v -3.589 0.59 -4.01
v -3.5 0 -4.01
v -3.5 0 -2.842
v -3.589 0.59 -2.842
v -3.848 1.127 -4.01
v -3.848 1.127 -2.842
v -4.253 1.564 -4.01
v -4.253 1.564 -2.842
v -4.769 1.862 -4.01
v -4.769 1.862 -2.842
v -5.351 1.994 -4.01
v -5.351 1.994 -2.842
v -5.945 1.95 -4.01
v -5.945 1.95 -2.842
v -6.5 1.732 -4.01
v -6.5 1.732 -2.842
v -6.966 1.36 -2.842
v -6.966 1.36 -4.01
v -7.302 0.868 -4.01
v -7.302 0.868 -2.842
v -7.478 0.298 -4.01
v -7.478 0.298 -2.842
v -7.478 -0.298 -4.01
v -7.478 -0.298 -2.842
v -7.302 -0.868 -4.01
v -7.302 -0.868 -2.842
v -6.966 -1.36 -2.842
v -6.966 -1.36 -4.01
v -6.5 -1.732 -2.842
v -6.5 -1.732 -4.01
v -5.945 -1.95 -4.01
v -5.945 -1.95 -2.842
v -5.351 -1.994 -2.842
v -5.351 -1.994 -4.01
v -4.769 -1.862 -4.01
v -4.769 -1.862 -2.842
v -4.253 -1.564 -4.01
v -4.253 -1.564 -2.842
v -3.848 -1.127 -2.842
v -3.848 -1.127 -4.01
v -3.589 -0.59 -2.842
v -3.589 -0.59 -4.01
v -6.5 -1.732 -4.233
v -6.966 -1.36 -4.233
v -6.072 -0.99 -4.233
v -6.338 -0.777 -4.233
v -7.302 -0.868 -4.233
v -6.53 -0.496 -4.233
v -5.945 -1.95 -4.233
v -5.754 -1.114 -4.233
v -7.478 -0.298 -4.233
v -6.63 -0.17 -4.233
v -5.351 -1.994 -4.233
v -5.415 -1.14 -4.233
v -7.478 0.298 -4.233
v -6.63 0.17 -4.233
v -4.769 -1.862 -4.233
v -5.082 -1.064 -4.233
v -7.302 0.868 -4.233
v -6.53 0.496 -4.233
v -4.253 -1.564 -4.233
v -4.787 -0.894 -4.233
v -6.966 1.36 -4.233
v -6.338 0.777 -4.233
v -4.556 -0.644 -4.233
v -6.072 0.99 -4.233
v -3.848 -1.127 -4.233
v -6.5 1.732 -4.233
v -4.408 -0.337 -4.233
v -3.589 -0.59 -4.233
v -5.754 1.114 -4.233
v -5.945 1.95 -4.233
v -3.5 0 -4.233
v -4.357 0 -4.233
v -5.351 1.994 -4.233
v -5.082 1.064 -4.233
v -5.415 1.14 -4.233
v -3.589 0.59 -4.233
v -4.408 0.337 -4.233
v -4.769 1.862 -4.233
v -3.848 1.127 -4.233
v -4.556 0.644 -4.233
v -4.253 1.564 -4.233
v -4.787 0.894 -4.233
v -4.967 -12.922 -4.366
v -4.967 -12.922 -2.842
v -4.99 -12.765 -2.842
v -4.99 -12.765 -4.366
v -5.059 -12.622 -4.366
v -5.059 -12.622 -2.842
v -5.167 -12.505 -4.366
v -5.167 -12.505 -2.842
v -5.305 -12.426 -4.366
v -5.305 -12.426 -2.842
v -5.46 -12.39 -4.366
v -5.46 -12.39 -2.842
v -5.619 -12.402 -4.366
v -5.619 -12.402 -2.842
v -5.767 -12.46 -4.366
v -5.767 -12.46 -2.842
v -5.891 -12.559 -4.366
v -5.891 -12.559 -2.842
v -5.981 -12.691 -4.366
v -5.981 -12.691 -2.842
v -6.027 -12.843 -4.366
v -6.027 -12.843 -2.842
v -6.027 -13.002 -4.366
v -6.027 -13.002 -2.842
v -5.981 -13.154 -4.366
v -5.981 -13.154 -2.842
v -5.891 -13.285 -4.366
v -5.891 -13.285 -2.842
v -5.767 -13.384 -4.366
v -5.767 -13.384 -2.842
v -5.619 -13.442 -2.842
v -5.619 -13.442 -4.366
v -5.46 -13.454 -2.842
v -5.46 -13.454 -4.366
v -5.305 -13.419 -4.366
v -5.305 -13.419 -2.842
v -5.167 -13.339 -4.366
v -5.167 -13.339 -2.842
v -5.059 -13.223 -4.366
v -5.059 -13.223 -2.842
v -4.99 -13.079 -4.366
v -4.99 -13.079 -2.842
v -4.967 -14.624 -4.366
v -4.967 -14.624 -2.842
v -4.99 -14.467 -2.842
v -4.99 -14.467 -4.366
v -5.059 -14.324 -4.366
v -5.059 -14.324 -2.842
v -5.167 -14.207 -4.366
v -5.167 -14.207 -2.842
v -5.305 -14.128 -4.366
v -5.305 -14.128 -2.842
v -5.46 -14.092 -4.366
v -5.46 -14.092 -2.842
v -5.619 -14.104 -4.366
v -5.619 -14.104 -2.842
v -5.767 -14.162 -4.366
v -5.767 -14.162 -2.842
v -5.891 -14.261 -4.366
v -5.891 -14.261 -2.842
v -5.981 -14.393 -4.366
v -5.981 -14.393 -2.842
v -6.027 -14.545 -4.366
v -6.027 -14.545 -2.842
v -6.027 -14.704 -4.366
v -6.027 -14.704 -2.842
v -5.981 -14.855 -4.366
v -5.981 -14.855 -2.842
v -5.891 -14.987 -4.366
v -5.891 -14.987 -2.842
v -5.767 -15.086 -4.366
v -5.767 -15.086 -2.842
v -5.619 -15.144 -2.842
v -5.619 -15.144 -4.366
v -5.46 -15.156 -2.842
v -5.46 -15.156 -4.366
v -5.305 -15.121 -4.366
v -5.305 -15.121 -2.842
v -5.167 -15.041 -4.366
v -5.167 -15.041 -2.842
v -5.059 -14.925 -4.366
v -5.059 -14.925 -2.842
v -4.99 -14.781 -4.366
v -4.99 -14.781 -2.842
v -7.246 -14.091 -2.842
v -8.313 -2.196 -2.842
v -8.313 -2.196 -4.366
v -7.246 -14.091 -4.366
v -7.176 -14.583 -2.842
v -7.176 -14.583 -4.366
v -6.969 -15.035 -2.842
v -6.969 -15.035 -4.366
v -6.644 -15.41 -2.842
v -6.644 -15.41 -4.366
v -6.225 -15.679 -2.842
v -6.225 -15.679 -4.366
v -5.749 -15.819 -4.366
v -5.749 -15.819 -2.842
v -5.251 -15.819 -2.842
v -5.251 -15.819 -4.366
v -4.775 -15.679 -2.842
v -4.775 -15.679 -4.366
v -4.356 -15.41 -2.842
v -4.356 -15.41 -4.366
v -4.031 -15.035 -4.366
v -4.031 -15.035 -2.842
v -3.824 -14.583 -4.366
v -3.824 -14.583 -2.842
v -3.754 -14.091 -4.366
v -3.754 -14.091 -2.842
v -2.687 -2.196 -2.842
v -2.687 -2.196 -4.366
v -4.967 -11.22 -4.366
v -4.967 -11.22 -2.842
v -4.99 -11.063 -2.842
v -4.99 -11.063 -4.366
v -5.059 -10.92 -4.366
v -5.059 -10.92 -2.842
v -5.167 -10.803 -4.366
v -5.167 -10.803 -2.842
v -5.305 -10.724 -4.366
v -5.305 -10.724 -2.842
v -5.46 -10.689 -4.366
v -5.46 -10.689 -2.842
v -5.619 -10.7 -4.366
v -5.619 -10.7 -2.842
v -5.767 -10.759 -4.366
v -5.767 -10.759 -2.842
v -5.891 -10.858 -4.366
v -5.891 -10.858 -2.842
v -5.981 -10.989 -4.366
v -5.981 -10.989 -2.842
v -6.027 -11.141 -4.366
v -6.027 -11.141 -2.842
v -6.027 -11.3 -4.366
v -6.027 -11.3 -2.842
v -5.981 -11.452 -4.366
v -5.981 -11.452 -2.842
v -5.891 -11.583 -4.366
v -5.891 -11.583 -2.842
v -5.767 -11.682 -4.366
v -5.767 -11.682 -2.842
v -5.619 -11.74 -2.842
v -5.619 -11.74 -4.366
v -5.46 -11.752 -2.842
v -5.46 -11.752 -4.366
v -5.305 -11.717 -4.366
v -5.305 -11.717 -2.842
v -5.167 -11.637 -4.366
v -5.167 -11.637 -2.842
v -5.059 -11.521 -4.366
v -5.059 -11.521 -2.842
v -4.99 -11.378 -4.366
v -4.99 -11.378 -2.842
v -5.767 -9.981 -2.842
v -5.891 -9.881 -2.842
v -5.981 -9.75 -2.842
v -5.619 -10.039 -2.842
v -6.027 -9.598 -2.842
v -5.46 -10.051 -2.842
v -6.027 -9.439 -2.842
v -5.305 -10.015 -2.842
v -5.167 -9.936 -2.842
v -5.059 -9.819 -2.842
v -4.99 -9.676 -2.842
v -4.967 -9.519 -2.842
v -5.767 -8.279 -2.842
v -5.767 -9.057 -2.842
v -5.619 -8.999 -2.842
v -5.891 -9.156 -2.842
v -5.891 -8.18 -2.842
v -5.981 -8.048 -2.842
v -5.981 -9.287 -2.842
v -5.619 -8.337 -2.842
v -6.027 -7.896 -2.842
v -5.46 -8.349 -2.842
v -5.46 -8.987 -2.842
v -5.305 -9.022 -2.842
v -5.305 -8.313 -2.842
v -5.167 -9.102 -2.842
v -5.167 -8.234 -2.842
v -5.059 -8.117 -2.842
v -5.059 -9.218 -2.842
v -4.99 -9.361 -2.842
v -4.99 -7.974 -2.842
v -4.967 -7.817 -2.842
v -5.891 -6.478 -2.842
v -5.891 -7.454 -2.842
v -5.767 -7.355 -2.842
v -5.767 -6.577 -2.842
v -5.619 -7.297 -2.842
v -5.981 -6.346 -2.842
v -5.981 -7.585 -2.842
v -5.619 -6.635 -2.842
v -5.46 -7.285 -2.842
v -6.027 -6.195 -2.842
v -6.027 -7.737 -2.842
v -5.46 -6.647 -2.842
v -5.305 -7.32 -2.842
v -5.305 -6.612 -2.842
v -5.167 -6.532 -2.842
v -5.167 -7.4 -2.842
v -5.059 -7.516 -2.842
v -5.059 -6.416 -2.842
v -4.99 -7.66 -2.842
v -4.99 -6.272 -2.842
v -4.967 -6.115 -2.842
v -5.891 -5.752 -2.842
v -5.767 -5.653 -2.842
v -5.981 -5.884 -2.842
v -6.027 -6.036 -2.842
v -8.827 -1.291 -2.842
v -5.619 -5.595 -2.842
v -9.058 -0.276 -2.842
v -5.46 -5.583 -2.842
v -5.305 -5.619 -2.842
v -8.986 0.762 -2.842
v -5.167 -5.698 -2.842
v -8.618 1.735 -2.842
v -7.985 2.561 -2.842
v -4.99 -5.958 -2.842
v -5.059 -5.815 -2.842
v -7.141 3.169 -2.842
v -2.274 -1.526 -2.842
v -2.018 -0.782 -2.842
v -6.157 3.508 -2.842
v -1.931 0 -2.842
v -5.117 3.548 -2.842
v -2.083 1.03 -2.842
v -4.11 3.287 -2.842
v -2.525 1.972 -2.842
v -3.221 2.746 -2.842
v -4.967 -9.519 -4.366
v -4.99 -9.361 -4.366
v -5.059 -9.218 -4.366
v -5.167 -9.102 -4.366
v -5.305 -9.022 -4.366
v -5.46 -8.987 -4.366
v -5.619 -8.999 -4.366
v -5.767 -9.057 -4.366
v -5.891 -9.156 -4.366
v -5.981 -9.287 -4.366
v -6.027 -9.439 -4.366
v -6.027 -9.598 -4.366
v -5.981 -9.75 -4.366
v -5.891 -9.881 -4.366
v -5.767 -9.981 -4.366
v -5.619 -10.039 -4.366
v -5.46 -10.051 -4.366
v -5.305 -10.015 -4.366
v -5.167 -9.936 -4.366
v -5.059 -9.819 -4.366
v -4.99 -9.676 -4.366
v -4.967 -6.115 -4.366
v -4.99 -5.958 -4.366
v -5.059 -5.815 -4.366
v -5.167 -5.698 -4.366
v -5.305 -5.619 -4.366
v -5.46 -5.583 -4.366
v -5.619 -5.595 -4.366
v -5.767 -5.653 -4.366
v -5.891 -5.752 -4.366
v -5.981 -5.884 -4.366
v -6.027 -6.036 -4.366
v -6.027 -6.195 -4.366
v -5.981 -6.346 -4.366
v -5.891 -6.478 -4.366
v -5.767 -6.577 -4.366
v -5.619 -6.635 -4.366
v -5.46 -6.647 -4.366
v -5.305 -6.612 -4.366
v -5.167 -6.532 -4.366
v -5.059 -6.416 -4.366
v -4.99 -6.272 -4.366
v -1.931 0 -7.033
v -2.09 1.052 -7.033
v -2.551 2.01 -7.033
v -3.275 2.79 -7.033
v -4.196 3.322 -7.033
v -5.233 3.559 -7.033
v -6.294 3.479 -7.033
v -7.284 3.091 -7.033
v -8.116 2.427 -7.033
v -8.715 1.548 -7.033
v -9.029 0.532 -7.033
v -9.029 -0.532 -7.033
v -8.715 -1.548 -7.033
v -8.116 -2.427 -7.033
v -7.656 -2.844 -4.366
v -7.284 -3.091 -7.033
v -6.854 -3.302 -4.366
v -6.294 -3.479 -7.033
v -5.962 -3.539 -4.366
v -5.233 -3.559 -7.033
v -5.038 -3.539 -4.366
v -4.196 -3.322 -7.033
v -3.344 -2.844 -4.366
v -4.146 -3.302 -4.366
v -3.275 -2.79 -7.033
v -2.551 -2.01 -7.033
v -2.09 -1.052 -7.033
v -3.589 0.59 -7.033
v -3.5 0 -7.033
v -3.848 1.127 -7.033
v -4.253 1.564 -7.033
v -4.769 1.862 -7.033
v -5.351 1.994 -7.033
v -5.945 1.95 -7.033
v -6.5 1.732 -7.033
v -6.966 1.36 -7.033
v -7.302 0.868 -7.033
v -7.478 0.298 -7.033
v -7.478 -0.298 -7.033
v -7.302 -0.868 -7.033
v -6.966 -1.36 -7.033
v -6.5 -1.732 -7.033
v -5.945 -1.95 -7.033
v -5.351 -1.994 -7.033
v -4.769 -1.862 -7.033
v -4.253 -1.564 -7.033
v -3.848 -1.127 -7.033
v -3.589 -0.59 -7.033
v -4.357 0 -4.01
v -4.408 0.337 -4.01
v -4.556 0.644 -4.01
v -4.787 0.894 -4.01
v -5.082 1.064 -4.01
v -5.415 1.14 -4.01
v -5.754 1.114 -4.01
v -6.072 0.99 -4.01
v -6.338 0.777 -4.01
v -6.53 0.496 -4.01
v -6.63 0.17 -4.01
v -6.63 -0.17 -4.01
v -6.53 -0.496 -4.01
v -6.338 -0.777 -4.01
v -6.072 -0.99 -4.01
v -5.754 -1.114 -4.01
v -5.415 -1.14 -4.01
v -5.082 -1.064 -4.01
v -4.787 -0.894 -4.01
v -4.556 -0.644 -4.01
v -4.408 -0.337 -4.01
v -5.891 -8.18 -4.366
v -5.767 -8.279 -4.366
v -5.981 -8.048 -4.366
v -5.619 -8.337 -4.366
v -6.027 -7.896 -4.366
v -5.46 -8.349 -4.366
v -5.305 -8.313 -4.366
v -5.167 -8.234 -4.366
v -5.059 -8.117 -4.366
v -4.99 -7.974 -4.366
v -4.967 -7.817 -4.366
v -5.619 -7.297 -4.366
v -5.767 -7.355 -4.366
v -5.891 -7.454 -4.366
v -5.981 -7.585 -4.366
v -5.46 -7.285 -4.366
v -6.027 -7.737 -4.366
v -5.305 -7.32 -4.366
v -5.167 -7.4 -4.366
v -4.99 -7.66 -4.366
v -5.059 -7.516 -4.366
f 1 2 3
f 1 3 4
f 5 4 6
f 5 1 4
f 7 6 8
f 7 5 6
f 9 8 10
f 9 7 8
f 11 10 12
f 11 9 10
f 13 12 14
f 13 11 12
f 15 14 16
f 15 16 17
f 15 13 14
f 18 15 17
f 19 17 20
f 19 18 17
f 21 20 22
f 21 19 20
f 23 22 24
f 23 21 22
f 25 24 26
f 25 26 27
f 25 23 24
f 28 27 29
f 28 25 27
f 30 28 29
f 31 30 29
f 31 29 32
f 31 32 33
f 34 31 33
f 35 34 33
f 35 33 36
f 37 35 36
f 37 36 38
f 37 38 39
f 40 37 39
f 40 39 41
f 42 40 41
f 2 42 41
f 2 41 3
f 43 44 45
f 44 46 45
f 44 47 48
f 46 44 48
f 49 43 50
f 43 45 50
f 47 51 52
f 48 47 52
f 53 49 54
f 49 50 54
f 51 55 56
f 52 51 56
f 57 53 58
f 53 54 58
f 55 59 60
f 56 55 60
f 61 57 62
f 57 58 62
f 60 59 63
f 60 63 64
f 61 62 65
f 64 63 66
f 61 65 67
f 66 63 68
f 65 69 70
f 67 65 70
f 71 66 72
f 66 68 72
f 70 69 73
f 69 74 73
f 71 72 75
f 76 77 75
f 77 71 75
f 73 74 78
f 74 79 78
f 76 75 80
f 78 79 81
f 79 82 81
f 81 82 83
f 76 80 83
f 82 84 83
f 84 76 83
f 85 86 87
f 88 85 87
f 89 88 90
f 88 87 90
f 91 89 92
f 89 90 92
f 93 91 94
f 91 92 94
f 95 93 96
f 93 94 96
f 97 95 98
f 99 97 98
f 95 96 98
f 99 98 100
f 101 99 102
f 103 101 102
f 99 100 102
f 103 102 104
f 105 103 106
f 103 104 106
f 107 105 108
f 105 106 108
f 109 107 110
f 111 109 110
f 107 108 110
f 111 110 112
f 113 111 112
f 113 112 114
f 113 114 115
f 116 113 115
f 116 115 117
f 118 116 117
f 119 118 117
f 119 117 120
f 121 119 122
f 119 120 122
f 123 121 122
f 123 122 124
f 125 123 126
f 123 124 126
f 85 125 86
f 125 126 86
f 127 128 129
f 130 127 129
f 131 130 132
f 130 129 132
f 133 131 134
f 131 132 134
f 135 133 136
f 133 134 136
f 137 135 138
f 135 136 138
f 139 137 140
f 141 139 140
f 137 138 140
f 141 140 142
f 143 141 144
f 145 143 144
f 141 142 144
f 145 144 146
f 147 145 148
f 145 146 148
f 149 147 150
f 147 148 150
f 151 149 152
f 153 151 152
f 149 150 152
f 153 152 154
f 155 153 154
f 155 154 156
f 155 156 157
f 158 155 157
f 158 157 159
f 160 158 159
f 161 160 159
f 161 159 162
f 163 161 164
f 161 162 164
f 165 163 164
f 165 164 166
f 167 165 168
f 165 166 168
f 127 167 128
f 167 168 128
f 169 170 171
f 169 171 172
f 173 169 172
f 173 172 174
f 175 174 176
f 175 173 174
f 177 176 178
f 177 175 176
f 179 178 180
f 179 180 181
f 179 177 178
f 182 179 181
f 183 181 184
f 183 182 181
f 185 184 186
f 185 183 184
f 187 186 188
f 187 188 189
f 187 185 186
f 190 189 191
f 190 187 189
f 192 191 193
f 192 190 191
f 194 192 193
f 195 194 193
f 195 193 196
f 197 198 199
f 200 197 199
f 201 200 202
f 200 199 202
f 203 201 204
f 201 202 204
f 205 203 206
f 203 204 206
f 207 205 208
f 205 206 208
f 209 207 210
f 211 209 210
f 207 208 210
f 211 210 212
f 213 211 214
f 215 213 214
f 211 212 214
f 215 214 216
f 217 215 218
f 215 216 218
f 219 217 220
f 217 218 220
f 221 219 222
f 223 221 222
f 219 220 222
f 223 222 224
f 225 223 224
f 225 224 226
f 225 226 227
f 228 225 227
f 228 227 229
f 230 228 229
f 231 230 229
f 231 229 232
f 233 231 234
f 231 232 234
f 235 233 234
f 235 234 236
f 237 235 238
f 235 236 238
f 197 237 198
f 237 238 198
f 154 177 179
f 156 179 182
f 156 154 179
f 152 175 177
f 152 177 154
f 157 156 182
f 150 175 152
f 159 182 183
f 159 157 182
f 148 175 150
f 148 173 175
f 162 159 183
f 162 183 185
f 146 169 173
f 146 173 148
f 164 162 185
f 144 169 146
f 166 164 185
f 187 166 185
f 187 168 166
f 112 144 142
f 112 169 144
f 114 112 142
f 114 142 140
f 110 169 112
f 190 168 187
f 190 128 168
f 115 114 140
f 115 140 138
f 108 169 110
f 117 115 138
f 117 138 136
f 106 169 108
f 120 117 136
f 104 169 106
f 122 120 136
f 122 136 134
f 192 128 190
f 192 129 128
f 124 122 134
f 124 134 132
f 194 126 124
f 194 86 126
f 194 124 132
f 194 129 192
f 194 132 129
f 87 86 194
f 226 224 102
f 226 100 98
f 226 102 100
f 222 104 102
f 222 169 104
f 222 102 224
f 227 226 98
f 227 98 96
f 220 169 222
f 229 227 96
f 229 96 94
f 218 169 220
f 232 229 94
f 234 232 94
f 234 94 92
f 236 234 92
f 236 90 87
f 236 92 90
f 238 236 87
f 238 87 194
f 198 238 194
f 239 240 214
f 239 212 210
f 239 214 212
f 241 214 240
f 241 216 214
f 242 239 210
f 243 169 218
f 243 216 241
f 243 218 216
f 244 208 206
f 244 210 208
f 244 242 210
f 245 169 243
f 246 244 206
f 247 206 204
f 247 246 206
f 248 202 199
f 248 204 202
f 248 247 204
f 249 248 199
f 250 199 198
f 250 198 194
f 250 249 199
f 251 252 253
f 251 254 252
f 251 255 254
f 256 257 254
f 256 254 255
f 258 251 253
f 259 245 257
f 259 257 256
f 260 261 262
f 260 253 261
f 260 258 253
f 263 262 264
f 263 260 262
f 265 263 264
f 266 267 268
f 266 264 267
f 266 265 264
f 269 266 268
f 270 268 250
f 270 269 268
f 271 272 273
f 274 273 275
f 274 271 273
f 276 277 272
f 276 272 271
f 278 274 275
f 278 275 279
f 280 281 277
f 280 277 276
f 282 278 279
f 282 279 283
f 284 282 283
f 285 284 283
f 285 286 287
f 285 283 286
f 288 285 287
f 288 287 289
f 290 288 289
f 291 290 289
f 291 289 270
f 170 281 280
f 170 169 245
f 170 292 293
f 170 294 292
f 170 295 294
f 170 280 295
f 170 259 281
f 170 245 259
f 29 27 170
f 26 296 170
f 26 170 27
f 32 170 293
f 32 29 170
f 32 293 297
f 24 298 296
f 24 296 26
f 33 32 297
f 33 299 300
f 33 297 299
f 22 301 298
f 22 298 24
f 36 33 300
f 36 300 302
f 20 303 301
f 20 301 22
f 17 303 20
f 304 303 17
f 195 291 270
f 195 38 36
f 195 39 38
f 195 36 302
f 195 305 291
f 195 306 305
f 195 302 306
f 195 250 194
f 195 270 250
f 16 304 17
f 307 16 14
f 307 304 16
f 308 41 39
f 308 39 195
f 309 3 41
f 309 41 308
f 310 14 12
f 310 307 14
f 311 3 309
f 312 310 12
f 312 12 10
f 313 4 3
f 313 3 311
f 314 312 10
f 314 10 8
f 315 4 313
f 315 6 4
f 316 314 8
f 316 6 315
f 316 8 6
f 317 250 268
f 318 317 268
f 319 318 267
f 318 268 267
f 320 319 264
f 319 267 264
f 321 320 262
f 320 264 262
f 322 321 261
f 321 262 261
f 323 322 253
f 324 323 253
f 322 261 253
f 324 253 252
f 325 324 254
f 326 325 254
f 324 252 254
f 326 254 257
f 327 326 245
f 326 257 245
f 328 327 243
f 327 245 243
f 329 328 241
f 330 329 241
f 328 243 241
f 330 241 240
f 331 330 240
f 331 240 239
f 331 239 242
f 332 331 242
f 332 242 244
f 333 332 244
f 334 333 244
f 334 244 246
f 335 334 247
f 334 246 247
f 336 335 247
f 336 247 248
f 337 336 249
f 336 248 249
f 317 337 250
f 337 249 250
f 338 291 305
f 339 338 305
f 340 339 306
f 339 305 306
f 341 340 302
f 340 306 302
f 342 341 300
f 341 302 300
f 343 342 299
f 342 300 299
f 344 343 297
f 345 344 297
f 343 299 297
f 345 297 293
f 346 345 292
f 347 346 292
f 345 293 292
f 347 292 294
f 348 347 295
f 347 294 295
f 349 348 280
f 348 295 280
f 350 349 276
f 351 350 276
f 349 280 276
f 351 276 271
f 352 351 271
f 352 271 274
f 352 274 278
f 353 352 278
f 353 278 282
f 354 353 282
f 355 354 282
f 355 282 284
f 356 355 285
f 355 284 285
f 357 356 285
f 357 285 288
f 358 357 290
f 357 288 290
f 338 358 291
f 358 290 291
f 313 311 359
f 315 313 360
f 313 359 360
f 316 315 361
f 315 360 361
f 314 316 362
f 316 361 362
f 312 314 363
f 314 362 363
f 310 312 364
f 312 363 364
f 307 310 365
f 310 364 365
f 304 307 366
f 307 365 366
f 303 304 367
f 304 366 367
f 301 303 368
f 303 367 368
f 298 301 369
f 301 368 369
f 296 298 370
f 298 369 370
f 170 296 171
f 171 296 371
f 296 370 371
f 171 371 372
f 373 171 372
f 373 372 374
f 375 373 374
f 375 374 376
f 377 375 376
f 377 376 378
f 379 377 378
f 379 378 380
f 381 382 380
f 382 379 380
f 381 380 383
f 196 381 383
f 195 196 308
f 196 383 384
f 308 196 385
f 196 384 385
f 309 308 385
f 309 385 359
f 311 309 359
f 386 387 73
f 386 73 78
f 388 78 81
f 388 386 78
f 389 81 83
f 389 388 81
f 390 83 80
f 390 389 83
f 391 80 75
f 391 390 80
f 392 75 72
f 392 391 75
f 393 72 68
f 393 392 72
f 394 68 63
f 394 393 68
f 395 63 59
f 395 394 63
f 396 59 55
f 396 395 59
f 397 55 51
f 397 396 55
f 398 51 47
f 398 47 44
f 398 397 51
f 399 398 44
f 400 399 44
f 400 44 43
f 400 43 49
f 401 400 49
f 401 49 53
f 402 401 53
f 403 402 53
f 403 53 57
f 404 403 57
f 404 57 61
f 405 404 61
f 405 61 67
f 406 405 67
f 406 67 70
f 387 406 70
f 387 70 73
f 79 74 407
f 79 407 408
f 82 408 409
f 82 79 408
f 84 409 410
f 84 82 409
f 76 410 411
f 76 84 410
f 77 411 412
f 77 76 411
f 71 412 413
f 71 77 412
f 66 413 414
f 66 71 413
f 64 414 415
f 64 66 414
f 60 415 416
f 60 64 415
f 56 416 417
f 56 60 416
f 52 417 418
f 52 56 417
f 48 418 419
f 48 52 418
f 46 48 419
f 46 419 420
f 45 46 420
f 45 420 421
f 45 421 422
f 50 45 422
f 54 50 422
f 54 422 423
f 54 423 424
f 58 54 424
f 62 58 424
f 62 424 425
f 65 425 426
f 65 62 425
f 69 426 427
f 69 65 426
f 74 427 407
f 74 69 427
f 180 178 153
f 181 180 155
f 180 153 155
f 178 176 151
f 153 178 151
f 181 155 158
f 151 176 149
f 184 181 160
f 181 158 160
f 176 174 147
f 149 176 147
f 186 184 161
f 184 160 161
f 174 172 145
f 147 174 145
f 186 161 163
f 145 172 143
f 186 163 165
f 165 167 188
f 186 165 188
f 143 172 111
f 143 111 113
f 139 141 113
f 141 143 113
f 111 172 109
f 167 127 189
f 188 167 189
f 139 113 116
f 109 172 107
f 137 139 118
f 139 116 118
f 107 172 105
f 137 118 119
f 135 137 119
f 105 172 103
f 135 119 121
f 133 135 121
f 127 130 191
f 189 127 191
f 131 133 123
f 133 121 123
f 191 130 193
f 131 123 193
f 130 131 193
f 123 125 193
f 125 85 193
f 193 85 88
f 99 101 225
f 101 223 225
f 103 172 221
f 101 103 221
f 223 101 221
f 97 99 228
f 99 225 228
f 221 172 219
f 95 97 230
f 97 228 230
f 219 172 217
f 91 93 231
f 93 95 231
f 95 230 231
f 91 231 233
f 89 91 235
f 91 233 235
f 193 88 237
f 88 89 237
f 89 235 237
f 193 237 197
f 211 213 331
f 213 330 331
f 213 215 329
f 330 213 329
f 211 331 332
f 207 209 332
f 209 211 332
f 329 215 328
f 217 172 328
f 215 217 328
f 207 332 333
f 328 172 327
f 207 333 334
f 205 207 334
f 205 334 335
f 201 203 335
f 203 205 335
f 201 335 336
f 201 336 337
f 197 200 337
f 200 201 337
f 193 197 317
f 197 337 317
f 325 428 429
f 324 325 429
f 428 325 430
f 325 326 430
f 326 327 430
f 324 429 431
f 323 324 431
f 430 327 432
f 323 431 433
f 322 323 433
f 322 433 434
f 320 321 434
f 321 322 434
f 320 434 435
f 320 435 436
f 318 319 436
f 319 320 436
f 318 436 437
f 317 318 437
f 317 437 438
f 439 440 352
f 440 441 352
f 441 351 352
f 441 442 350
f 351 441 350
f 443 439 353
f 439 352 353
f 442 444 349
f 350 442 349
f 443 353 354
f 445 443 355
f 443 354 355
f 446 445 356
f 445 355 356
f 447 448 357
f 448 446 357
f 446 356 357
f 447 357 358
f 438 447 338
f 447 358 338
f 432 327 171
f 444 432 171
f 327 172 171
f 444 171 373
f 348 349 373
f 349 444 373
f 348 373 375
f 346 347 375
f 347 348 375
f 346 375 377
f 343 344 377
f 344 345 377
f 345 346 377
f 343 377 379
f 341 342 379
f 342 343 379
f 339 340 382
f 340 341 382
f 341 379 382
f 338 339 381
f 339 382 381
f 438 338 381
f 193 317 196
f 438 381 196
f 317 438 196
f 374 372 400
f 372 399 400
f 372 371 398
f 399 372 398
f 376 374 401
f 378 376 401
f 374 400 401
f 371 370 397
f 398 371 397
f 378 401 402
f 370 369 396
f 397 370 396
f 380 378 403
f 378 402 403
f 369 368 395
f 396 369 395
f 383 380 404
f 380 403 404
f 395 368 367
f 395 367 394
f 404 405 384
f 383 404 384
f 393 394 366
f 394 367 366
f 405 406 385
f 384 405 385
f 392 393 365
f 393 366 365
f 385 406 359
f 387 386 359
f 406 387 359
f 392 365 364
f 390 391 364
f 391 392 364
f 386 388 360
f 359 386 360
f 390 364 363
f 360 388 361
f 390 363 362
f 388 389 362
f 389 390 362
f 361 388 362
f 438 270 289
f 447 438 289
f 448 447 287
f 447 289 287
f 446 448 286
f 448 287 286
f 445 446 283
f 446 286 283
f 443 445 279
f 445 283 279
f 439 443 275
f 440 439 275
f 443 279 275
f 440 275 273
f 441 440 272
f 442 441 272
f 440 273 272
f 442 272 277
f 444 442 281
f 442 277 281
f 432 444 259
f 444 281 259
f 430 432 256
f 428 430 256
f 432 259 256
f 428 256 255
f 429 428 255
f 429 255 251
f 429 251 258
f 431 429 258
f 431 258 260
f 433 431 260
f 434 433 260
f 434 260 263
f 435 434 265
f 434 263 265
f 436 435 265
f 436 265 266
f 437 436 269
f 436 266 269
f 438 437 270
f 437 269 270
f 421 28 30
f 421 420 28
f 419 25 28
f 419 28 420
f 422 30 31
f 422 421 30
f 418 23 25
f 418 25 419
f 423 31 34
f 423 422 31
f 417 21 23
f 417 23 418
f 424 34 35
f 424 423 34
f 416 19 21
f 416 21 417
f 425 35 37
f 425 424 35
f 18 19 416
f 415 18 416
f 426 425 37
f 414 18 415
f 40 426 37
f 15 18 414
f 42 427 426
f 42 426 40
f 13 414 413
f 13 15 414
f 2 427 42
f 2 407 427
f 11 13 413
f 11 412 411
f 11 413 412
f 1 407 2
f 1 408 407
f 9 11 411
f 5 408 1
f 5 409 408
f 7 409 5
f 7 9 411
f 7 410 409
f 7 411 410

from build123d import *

# Parameters (mm, degrees)
SKETCH1_R           = 3.5687
SKETCH1_R_2         = 2
BOSS_EXTRUDE1_DEPTH = 4.191
SKETCH5_R           = 2
SKETCH5_R_2         = 1.143
BOSS_EXTRUDE2_DEPTH = 0.2226
SKETCH6_R           = 0.5334
BOSS_EXTRUDE3_DEPTH = 1.524


with BuildPart() as part:
    # Sketch1 → Boss-Extrude1 (new body)
    with BuildSketch(Plane.XY.offset(-7.032965862)):
        with Locations((-5.5, 0)):
            Circle(SKETCH1_R)
        with Locations((-5.5, 0)):
            Circle(SKETCH1_R_2, mode=Mode.SUBTRACT)
    extrude(amount=BOSS_EXTRUDE1_DEPTH)

    # Sketch5 → Boss-Extrude2 (add)
    with BuildSketch(Plane.XY.offset(-4.232965862)):
        with Locations((-5.5, 0)):
            Circle(SKETCH5_R)
        with Locations((-5.5, 0)):
            Circle(SKETCH5_R_2, mode=Mode.SUBTRACT)
    extrude(amount=BOSS_EXTRUDE2_DEPTH)

    # Sketch6 → Boss-Extrude3 (add)
    with BuildSketch(Plane.XY.offset(-2.841965862)):
        with BuildLine():
            Line((-3.75375, -14.09065), (-2.68695, -2.195989387))
            ThreePointArc((-2.68695, -2.195989387), (-5.5, -3.5687), (-8.31305, -2.195989387))
            Line((-8.31305, -2.195989387), (-7.24625, -14.09065))
            ThreePointArc((-7.24625, -14.09065), (-5.5, -15.8369), (-3.75375, -14.09065))
        make_face()
        with Locations((-5.5, -12.92225)):
            Circle(SKETCH6_R, mode=Mode.SUBTRACT)
        with Locations((-5.5, -14.62405)):
            Circle(SKETCH6_R, mode=Mode.SUBTRACT)
        with Locations((-5.5, -11.22045)):
            Circle(SKETCH6_R, mode=Mode.SUBTRACT)
        with Locations((-5.5, -9.51865)):
            Circle(SKETCH6_R, mode=Mode.SUBTRACT)
        with Locations((-5.5, -7.81685)):
            Circle(SKETCH6_R, mode=Mode.SUBTRACT)
        with Locations((-5.5, -6.11505)):
            Circle(SKETCH6_R, mode=Mode.SUBTRACT)
    extrude(amount=-BOSS_EXTRUDE3_DEPTH)


solid = part.part
